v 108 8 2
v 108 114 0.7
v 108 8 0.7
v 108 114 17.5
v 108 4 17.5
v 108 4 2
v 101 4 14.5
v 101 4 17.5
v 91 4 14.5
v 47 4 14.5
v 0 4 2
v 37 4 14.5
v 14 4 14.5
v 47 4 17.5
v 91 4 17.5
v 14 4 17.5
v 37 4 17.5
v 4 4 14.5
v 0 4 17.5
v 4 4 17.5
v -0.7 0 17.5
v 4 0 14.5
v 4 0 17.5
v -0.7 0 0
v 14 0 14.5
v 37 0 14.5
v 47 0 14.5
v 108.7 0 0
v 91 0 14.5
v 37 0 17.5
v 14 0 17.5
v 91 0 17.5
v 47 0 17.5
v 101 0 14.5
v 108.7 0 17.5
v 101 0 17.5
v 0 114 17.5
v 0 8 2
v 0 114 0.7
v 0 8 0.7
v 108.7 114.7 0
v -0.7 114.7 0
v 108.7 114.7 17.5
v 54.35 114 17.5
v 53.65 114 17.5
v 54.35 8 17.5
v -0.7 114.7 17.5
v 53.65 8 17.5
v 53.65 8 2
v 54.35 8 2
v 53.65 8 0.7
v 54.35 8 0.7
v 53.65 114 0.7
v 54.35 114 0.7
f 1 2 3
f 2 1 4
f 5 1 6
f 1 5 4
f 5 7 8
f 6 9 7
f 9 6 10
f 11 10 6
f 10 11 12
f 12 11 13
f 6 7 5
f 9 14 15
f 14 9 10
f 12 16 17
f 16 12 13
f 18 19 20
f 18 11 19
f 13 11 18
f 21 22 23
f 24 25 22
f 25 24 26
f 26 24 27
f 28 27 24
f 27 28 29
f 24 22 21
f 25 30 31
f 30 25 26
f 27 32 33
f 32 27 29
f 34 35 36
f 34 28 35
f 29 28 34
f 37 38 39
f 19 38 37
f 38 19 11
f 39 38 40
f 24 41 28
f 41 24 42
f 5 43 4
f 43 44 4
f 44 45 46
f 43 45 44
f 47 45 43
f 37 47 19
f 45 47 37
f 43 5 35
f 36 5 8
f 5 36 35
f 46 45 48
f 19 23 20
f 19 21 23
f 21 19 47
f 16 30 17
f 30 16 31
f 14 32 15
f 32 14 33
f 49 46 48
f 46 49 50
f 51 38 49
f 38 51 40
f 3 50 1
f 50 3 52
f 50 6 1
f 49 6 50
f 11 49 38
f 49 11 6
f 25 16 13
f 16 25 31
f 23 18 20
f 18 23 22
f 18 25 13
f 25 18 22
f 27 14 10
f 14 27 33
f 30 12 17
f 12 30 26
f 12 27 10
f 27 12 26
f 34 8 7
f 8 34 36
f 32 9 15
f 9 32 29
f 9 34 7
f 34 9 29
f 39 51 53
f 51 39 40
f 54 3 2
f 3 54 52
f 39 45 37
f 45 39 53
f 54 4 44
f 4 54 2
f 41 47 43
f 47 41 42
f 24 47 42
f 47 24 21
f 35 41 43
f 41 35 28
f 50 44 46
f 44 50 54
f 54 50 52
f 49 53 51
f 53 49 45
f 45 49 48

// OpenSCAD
h = 4;
b = 17.5;
l = 108;
hr = 114;
dr = 0.7;

h2 = 4;
b2 = 2;


ba = 3;
la = 10;

a1 = 4;
a2 = a1 + 33;
a3 = a2 + 54;

translate([0,0,b])
rotate([-90,0,0])
difference(){
	union(){
		cube([l,b,h]);
		translate([0,b-b2,h]) cube([l,b2,h2]);
	}
	translate([a1,0,-h/2]) cube([la,ba,2*h]);
	translate([a2,0,-h/2]) cube([la,ba,2*h]);
	translate([a3,0,-h/2]) cube([la,ba,2*h]);

}

translate([0,0,0]) cube([l,hr,dr]);
translate([0,hr,0]) cube([l,dr,b]);
translate([-dr,0,0]) cube([dr,hr+dr,b]);
translate([l,0,0]) cube([dr,hr+dr,b]);
translate([l/2-dr/2,h*2,0]) cube([dr,hr+dr-2*h,b]);
